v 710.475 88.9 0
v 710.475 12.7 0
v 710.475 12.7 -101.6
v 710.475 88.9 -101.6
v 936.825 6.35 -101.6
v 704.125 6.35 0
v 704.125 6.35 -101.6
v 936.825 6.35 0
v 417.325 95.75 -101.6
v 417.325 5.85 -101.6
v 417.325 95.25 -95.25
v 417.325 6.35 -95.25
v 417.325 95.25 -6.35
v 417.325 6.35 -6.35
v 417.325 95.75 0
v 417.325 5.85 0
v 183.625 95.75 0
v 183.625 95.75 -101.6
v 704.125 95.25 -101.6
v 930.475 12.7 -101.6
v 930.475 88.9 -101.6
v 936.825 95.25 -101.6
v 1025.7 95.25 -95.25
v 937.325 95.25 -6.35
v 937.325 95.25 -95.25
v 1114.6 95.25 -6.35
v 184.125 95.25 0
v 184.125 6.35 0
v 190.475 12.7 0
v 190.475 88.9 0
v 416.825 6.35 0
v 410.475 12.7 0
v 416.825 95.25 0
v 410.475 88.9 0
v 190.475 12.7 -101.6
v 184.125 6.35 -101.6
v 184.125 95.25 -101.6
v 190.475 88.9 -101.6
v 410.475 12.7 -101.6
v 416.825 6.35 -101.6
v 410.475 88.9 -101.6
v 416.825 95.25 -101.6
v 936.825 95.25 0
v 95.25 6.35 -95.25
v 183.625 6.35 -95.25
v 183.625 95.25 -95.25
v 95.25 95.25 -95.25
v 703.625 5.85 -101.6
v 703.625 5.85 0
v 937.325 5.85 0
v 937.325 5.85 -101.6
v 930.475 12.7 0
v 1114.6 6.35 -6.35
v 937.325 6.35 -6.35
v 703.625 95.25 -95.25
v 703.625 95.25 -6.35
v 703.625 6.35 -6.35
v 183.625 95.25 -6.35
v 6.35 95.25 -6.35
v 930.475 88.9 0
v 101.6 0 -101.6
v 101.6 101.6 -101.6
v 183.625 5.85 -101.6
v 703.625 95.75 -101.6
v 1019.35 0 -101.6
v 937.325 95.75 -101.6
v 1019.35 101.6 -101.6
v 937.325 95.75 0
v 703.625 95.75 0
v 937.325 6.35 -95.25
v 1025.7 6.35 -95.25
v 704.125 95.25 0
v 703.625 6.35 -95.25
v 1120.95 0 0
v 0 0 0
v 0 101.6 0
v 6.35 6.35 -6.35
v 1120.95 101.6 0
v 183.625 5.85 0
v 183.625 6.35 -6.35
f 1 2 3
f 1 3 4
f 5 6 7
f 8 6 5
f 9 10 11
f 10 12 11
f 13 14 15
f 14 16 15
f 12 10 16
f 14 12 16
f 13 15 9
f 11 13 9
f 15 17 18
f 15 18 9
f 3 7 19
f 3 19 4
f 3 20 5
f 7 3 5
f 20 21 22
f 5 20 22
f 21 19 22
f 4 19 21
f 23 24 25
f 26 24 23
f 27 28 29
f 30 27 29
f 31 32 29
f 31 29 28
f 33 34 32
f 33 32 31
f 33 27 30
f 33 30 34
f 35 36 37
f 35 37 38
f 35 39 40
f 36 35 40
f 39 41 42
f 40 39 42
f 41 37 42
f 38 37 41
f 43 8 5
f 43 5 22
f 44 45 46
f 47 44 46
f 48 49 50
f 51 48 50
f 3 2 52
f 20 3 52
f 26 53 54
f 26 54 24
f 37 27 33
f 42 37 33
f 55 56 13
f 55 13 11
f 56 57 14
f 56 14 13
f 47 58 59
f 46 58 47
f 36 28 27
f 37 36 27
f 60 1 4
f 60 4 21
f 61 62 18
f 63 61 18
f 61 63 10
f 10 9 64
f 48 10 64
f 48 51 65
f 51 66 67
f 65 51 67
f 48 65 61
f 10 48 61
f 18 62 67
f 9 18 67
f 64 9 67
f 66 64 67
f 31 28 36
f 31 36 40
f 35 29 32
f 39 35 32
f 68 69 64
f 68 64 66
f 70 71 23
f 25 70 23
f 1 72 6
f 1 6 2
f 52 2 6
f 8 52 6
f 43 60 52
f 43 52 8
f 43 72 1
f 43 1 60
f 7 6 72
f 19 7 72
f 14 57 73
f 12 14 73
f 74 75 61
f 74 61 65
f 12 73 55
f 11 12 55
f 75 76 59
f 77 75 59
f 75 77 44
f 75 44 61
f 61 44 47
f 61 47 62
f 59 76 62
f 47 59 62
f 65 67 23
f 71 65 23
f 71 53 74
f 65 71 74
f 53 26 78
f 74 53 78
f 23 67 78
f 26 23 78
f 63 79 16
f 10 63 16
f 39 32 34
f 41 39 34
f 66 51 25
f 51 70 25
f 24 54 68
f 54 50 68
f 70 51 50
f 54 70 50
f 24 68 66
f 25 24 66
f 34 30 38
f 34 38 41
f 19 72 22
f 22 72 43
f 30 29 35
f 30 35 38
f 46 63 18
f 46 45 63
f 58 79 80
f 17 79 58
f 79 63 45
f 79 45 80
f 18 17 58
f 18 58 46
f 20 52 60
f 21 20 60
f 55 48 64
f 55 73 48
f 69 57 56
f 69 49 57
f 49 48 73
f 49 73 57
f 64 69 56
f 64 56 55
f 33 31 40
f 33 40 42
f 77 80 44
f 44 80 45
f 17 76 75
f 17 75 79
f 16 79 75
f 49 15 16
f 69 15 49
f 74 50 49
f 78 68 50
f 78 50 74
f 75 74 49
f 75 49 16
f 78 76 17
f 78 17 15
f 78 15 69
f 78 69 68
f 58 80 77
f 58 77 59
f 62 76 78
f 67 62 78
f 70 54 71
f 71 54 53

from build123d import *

# Parameters (mm, degrees)
CROQUIS1_W              = 1120.95
CROQUIS1_H              = 101.6
SALIENTE_EXTRUIR1_DEPTH = 101.6
CROQUIS3_W              = 88.9
CROQUIS3_H              = 88.9
CORTAR_EXTRUIR1_DEPTH   = 1120.95
CORTAR_EXTRUIR2_DEPTH   = 101.6
CORTAR_EXTRUIR3_REACH   = 1132.121
CROQUIS5_W              = 220
CROQUIS5_H              = 76.2
CROQUIS6_W              = 232.7
CROQUIS6_H              = 88.9
CROQUIS6_W_2            = 220
CROQUIS6_H_2            = 76.2
SALIENTE_EXTRUIR2_DEPTH = 101.6
CORTAR_EXTRUIR4_REACH   = 1132.121
CROQUIS7_W              = 233.7
CROQUIS7_H              = 89.9
CROQUIS7_W_2            = 232.7
CROQUIS7_H_2            = 88.9


with BuildPart() as part:
    # Croquis1 → Saliente-Extruir1 (new body)
    with BuildSketch(Plane.XY):
        with Locations((560.475, 50.8)):
            Rectangle(CROQUIS1_W, CROQUIS1_H)
    extrude(amount=-SALIENTE_EXTRUIR1_DEPTH)

    # Croquis3 → Cortar-Extruir1 (cut)
    with BuildSketch(Plane(origin=(1120.95, 0, 0), x_dir=(0, 0, -1), z_dir=(1, 0, 0))):
        with Locations((50.8, 50.8)):
            Rectangle(CROQUIS3_W, CROQUIS3_H)
    extrude(amount=-CORTAR_EXTRUIR1_DEPTH, mode=Mode.SUBTRACT)

    # Croquis4 → Cortar-Extruir2 (cut)
    with BuildSketch(Plane(origin=(0, 101.6, 0), x_dir=(1, 0, 0), z_dir=(0, 1, 0))):
        Polygon((1120.95, 101.6), (1019.35, 101.6), (1120.95, 0), align=None)
        Polygon((101.6, 101.6), (0, 101.6), (0, 0), align=None)
    extrude(amount=-CORTAR_EXTRUIR2_DEPTH, mode=Mode.SUBTRACT)

    # Cortar-Extruir3: up to this face of the body (flat: up to its plane)
    cortar_extruir3_end = Plane(part.part.faces().sort_by_distance((560.475, 50.8, -101.6))[0])
    # Croquis5 → Cortar-Extruir3 (cut, up to the picked face)
    with BuildSketch(Plane.XY, mode=Mode.PRIVATE) as cortar_extruir3_sk1:
        with Locations((300.475, 50.8)):
            Rectangle(CROQUIS5_W, CROQUIS5_H)
    cortar_extruir3_tool1 = split(extrude(cortar_extruir3_sk1.sketch, amount=-CORTAR_EXTRUIR3_REACH, mode=Mode.PRIVATE), bisect_by=cortar_extruir3_end, keep=Keep.BOTH, mode=Mode.PRIVATE)
    # Croquis5 → Cortar-Extruir3 (cut, up to the picked face)
    with BuildSketch(Plane.XY, mode=Mode.PRIVATE) as cortar_extruir3_sk2:
        with Locations((820.475, 50.8)):
            Rectangle(CROQUIS5_W, CROQUIS5_H)
    cortar_extruir3_tool2 = split(extrude(cortar_extruir3_sk2.sketch, amount=-CORTAR_EXTRUIR3_REACH, mode=Mode.PRIVATE), bisect_by=cortar_extruir3_end, keep=Keep.BOTH, mode=Mode.PRIVATE)
    add(cortar_extruir3_tool1.solids().sort_by(Axis((300.475, 50.8, 0), (0, 0, -1)))[0], mode=Mode.SUBTRACT)
    add(cortar_extruir3_tool2.solids().sort_by(Axis((820.475, 50.8, 0), (0, 0, -1)))[0], mode=Mode.SUBTRACT)

    # Croquis6 → Saliente-Extruir2 (add)
    # profile 1 of 2: a face of its own
    with BuildSketch(Plane.XY):
        with Locations((300.475, 50.8)):
            Rectangle(CROQUIS6_W, CROQUIS6_H)
        with Locations((300.475, 50.8)):
            Rectangle(CROQUIS6_W_2, CROQUIS6_H_2, mode=Mode.SUBTRACT)
    # profile 2 of 2: a face of its own
    with BuildSketch(Plane.XY):
        with Locations((820.475, 50.8)):
            Rectangle(CROQUIS6_W, CROQUIS6_H)
        with Locations((820.475, 50.8)):
            Rectangle(CROQUIS6_W_2, CROQUIS6_H_2, mode=Mode.SUBTRACT)
    extrude(amount=-SALIENTE_EXTRUIR2_DEPTH)

    # Cortar-Extruir4: up to this face of the body (flat: up to its plane)
    cortar_extruir4_end = Plane(part.part.faces().sort_by_distance((560.475, 50.8, -101.6))[0])
    # Croquis7 → Cortar-Extruir4 (cut, up to the picked face)
    with BuildSketch(Plane.XY, mode=Mode.PRIVATE) as cortar_extruir4_sk1:
        with Locations((300.475, 50.8)):
            Rectangle(CROQUIS7_W, CROQUIS7_H)
        with Locations((300.475, 50.8)):
            Rectangle(CROQUIS7_W_2, CROQUIS7_H_2, mode=Mode.SUBTRACT)
    cortar_extruir4_tool1 = split(extrude(cortar_extruir4_sk1.sketch, amount=-CORTAR_EXTRUIR4_REACH, mode=Mode.PRIVATE), bisect_by=cortar_extruir4_end, keep=Keep.BOTH, mode=Mode.PRIVATE)
    # Croquis7 → Cortar-Extruir4 (cut, up to the picked face)
    with BuildSketch(Plane.XY, mode=Mode.PRIVATE) as cortar_extruir4_sk2:
        with Locations((820.475, 50.8)):
            Rectangle(CROQUIS7_W, CROQUIS7_H)
        with Locations((820.475, 50.8)):
            Rectangle(CROQUIS7_W_2, CROQUIS7_H_2, mode=Mode.SUBTRACT)
    cortar_extruir4_tool2 = split(extrude(cortar_extruir4_sk2.sketch, amount=-CORTAR_EXTRUIR4_REACH, mode=Mode.PRIVATE), bisect_by=cortar_extruir4_end, keep=Keep.BOTH, mode=Mode.PRIVATE)
    add(cortar_extruir4_tool1.solids().sort_by(Axis((300.475, 6.100395, 0), (0, 0, -1)))[0], mode=Mode.SUBTRACT)
    add(cortar_extruir4_tool2.solids().sort_by(Axis((820.475, 6.100395, 0), (0, 0, -1)))[0], mode=Mode.SUBTRACT)


with BuildPart() as cortar_extruir4_piece_1:
    # of the separate pieces the step leaves, piece 1, a body of its own (cortar_extruir4_pieces)
    add(part.part.solids().sort_by_distance((0, 0, 0))[0])


with BuildPart() as cortar_extruir4_piece_2:
    # of the separate pieces the step leaves, piece 2, a body of its own (cortar_extruir4_pieces)
    add(part.part.solids().sort_by_distance((936.825, 95.25, 0))[0])


with BuildPart() as cortar_extruir4_piece_3:
    # of the separate pieces the step leaves, piece 3, a body of its own (cortar_extruir4_pieces)
    add(part.part.solids().sort_by_distance((416.825, 95.25, 0))[0])


solid = Compound([cortar_extruir4_piece_1.part, cortar_extruir4_piece_2.part, cortar_extruir4_piece_3.part])
